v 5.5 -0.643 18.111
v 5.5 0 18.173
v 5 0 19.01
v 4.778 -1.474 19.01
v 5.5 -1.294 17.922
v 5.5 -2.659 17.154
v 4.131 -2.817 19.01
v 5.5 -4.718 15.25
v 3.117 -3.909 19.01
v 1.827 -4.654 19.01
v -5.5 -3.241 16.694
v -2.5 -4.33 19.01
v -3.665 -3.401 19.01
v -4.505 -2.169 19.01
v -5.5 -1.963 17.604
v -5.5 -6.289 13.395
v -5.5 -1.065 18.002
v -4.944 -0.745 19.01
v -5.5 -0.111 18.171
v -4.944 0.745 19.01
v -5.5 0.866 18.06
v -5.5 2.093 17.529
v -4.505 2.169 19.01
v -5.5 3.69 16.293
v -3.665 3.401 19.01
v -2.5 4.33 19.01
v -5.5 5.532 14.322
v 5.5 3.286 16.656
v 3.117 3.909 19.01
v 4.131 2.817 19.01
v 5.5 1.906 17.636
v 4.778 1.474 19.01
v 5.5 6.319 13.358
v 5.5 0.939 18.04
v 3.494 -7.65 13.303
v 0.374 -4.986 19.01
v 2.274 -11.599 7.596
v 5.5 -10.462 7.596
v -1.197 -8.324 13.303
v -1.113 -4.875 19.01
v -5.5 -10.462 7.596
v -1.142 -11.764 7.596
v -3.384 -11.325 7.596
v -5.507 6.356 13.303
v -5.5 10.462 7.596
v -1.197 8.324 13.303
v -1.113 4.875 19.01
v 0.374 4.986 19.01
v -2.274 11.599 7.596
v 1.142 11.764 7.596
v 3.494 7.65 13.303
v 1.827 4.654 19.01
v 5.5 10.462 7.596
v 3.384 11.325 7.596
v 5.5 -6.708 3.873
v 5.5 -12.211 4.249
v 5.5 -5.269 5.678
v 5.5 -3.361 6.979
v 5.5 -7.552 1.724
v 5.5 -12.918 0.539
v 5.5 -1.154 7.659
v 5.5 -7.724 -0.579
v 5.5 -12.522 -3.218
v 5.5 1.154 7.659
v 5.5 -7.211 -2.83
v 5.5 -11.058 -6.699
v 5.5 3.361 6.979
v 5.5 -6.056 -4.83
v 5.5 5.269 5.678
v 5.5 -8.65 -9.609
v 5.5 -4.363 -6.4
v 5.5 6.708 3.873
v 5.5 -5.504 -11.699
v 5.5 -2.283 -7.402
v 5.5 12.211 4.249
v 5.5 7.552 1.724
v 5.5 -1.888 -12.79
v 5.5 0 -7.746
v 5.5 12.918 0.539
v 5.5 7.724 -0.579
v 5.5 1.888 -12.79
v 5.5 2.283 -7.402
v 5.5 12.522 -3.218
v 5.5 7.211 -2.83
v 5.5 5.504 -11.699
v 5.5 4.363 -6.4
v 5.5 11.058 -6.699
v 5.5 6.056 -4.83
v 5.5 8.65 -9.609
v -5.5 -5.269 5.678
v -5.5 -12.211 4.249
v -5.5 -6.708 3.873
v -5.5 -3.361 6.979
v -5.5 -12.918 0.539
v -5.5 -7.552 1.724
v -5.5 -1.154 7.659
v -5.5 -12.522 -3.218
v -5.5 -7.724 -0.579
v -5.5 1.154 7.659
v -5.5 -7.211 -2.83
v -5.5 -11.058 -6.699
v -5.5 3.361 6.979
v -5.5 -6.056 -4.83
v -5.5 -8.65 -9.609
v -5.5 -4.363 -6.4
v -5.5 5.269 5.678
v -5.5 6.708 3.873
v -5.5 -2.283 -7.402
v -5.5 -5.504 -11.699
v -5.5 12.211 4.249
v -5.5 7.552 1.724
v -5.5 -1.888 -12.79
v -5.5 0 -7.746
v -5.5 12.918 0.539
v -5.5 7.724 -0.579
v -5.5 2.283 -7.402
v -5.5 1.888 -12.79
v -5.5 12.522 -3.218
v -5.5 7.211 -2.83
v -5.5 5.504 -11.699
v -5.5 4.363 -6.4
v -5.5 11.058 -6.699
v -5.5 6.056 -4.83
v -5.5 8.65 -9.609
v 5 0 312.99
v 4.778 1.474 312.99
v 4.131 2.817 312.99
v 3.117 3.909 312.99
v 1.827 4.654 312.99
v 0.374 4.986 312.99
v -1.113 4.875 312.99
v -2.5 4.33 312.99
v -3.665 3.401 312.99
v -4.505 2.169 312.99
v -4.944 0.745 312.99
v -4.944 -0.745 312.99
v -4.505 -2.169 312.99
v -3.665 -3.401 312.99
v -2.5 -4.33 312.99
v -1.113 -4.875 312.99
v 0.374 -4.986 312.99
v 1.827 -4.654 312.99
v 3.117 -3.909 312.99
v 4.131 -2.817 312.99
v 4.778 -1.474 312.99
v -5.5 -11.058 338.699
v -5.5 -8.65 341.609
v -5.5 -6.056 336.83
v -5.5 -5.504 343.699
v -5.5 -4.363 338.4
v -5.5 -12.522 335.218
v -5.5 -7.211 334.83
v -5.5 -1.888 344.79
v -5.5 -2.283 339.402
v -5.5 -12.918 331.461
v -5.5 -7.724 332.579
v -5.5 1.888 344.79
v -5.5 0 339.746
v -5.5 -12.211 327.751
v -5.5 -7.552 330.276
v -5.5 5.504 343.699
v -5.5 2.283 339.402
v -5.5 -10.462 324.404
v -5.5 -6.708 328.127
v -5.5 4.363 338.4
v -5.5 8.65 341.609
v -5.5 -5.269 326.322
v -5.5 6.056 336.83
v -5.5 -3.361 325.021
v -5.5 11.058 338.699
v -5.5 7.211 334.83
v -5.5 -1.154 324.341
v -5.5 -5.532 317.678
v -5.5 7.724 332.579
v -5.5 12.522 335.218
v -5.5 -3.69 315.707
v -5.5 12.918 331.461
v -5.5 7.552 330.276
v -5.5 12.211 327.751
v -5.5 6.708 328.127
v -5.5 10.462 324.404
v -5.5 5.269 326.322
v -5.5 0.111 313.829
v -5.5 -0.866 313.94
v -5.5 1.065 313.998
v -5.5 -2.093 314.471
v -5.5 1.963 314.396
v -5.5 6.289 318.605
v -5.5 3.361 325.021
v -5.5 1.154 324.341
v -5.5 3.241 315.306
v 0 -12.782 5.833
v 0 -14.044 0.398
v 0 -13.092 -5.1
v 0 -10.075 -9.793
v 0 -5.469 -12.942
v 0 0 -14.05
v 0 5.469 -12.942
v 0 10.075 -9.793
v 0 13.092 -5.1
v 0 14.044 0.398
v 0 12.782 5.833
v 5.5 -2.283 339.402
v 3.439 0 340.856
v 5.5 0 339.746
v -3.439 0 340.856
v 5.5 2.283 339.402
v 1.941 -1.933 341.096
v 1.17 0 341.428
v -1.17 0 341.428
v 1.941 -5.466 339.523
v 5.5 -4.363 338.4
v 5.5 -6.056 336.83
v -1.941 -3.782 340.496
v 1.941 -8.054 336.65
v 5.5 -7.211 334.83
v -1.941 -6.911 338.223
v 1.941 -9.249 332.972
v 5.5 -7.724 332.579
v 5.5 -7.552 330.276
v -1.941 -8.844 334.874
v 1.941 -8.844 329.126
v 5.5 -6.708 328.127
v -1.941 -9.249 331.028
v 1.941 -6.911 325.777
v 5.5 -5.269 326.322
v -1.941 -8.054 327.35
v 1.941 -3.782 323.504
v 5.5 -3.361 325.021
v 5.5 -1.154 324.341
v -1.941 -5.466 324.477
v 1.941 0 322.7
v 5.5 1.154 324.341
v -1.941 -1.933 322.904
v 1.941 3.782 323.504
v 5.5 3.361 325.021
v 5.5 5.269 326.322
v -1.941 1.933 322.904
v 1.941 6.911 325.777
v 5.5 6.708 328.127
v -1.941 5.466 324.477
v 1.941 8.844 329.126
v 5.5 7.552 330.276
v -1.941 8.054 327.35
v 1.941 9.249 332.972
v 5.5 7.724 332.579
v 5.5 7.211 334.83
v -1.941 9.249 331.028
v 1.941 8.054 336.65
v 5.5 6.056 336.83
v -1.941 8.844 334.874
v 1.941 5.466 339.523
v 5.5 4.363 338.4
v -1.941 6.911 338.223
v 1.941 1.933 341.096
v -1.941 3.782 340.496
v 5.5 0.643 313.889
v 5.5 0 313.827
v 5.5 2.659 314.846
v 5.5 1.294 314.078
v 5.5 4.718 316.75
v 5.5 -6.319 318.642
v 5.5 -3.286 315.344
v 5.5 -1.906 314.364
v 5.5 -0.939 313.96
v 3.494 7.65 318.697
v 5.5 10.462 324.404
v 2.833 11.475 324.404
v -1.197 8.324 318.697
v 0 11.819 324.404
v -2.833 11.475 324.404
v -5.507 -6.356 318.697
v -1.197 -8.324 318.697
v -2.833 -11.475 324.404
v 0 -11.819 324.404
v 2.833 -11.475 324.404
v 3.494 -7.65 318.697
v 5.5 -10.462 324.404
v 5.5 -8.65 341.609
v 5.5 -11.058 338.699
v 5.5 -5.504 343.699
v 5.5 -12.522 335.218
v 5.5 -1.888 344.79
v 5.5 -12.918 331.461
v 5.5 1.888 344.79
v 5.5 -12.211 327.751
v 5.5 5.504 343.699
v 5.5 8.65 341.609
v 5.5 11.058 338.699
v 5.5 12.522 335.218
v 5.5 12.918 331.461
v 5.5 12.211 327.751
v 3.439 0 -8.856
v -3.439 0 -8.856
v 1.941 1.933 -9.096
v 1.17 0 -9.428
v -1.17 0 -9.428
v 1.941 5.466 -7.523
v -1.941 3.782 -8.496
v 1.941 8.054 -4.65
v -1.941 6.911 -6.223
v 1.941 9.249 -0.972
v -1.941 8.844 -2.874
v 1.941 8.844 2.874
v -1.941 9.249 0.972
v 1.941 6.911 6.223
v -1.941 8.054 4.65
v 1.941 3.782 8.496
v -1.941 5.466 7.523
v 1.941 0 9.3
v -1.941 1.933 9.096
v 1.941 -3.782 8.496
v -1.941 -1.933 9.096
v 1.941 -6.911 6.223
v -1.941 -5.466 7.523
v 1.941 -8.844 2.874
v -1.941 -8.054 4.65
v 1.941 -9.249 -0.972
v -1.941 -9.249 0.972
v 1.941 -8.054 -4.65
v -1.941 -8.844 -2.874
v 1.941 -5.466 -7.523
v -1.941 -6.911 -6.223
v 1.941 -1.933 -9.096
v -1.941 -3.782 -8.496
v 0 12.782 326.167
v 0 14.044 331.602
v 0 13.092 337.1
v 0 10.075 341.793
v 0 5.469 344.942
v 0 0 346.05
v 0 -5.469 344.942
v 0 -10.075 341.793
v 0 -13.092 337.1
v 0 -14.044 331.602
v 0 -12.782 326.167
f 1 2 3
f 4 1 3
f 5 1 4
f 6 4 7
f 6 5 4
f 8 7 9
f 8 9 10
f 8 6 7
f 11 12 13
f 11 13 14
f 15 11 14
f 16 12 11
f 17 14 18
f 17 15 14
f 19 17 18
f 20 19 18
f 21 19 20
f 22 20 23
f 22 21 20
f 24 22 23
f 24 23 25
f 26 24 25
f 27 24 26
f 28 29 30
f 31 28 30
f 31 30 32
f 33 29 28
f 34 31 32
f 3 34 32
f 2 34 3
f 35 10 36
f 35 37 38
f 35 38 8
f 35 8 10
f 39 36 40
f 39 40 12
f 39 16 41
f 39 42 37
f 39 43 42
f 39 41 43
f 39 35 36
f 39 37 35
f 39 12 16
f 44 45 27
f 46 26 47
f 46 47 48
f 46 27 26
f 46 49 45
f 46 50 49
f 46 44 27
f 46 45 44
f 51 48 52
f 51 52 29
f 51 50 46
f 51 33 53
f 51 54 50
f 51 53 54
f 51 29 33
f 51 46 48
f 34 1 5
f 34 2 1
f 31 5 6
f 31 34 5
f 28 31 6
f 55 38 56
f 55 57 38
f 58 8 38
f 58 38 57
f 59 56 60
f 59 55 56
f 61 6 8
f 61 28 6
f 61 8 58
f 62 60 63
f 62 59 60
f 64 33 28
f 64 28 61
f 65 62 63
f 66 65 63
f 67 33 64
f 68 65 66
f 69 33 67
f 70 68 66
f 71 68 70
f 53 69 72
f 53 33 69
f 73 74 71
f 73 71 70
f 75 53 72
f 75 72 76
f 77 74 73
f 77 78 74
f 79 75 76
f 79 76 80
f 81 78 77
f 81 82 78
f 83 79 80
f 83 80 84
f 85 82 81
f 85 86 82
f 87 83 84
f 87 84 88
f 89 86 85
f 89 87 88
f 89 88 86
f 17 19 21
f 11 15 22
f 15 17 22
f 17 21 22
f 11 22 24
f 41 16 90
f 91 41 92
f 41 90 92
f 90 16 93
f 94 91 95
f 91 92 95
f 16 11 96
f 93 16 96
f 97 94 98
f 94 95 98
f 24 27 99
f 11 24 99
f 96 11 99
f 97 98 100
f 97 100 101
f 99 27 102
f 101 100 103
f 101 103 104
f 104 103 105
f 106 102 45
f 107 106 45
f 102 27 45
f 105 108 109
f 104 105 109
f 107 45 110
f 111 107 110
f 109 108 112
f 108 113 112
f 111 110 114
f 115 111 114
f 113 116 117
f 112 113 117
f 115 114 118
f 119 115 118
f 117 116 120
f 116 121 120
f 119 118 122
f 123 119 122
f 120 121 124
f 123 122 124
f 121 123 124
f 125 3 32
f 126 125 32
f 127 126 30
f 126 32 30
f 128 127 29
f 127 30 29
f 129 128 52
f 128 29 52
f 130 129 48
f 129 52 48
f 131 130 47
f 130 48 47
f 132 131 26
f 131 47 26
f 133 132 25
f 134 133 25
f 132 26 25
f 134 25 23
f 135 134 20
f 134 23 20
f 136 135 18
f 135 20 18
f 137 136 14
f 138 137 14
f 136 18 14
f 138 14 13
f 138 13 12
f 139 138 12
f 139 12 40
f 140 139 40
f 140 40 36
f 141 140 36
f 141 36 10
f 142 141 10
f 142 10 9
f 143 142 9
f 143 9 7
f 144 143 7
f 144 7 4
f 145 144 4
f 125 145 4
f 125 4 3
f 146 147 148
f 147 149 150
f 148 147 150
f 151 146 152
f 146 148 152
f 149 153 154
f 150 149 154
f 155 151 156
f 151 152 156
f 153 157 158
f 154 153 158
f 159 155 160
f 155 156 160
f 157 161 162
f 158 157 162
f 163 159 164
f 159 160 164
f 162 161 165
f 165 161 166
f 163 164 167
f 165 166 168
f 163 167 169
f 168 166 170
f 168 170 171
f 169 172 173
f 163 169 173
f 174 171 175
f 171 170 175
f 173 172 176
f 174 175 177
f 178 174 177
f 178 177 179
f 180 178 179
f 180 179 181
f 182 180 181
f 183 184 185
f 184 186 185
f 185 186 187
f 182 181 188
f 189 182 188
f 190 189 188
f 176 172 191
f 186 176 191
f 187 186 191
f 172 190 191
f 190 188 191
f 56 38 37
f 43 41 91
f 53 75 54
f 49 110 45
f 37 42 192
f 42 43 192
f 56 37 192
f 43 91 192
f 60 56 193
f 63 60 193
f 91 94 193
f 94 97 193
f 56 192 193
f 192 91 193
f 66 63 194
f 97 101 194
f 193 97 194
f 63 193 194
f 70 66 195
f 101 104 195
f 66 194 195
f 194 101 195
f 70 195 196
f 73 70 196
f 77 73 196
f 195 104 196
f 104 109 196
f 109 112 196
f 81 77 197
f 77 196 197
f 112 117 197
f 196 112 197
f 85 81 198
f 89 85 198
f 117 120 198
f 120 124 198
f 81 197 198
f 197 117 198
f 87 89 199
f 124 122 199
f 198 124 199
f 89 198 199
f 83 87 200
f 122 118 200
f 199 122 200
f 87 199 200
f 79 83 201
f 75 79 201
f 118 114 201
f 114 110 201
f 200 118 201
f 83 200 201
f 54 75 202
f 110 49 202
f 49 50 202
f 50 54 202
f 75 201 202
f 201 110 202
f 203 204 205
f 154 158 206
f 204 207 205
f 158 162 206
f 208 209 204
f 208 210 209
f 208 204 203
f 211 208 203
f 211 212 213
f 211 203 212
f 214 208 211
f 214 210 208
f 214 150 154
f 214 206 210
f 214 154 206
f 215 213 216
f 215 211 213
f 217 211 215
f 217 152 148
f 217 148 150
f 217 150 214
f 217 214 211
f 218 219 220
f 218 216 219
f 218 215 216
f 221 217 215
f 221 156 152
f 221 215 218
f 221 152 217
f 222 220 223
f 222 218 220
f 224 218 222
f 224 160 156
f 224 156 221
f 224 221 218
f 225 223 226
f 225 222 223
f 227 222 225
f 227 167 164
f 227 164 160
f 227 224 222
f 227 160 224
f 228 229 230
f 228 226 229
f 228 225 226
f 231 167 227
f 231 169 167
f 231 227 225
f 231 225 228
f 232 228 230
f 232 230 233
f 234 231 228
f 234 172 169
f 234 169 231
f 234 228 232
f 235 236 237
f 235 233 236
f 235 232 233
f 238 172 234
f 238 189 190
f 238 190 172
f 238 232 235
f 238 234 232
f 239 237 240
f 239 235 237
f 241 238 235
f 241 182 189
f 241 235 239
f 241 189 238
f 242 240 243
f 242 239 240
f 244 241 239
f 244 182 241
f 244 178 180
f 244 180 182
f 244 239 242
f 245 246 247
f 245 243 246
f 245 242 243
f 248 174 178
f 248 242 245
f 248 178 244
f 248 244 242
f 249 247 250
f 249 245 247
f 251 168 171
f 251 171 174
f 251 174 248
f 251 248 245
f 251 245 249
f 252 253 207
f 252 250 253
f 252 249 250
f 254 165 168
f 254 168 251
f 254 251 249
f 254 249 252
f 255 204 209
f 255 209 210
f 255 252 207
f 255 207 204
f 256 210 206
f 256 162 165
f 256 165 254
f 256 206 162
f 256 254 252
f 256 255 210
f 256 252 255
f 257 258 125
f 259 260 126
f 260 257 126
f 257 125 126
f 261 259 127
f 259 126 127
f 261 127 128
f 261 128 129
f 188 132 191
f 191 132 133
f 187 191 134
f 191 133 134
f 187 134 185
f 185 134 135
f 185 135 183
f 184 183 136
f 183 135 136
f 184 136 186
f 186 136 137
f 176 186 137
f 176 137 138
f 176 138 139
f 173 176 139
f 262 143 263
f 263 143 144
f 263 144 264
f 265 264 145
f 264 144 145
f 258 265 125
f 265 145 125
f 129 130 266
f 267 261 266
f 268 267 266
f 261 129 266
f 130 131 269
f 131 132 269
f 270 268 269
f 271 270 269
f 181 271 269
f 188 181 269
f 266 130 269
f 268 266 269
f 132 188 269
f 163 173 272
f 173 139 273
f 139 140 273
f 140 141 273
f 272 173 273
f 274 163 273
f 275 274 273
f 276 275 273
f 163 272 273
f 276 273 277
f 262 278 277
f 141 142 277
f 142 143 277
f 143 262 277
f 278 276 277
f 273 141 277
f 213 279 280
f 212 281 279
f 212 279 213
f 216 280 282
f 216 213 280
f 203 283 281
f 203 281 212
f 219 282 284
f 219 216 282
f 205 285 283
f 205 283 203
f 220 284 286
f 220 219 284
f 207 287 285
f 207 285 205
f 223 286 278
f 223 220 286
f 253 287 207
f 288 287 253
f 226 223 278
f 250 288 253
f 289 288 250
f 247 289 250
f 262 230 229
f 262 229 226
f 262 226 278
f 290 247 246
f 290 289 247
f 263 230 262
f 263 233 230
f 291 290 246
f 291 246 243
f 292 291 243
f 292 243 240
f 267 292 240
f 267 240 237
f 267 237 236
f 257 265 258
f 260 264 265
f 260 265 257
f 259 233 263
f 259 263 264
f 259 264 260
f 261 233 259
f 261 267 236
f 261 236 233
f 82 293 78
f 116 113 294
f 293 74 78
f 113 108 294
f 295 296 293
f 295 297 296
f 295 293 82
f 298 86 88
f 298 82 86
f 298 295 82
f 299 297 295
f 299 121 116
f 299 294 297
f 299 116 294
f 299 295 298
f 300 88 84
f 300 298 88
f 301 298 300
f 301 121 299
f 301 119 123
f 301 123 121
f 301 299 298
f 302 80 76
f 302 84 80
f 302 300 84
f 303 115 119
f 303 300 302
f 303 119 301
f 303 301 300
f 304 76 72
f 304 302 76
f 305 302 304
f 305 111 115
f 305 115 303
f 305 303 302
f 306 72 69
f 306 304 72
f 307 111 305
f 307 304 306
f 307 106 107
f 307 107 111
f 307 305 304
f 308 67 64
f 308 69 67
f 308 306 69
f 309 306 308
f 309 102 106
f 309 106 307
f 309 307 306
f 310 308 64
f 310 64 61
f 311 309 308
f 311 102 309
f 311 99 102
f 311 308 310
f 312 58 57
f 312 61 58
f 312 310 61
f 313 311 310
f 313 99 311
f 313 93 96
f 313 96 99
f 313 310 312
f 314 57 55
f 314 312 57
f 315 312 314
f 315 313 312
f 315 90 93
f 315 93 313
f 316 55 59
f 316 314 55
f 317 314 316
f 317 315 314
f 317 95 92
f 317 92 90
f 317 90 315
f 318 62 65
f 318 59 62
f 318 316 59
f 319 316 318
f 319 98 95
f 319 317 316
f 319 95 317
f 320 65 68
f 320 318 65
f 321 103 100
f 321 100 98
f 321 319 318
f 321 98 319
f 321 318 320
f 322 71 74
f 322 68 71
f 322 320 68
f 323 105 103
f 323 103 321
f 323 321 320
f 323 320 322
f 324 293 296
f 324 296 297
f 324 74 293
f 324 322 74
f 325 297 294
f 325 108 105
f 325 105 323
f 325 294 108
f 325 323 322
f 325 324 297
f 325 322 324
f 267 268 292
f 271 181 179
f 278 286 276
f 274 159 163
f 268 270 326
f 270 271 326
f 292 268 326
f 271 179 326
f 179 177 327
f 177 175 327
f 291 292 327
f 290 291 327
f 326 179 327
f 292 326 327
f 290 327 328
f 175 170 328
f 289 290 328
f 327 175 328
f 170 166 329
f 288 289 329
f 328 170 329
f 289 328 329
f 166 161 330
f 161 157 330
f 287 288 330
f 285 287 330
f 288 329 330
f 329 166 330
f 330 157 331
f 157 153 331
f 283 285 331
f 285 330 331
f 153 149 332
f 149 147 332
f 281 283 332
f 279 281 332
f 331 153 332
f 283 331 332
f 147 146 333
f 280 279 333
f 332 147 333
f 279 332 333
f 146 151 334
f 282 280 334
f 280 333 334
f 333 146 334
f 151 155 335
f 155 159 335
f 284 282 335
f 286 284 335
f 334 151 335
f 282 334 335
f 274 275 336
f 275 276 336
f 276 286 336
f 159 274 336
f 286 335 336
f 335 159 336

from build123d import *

# Parameters (mm, degrees)
SKETCH3_R           = 5
BOSS_EXTRUDE2_DEPTH = 332
CUT_EXTRUDE1_START  = -5.5
SKETCH7_R           = 24.093580554
CUT_EXTRUDE1_DEPTH  = 342.119975622
CUT_EXTRUDE2_START  = 5.5
SKETCH7_2_R         = 24.093580554
CUT_EXTRUDE2_DEPTH  = 342.119975622


with BuildPart() as part:
    # Sketch3 → Boss-Extrude2 (new body)
    with BuildSketch(Plane.XY):
        Circle(SKETCH3_R)
    extrude(amount=BOSS_EXTRUDE2_DEPTH)

    # Sketch4 → Revolve10 (revolve)
    with BuildSketch(Plane(origin=(0, 0, 0), x_dir=(1, 0, 0), z_dir=(0, 1, 0))):
        with BuildLine():
            Line((14.05, -332), (-14.05, -332))
            ThreePointArc((-14.05, -332), (0, -346.05), (14.05, -332))
        make_face()
    revolve(axis=Axis((-14.05, 0, 332), (1, 0, 0)))

    # Sketch4<6> → Revolve11 (revolve)
    with BuildSketch(Plane(origin=(0, 0, 0), x_dir=(1, 0, 0), z_dir=(0, 1, 0))):
        with BuildLine():
            ThreePointArc((14.05, 0), (0, 14.05), (-14.05, 0))
            Line((-14.05, 0), (14.05, 0))
        make_face()
    revolve(axis=Axis((-14.05, 0, 0), (1, 0, 0)))

    # Sketch8 → Revolve12 (revolve)
    with BuildSketch(Plane(origin=(0, 0, 0), x_dir=(1, 0, 0), z_dir=(0, 1, 0))):
        Polygon((12.29, -6.808700317), (0, -6.808700317), (0, -19.01), (5, -19.01), align=None)
    revolve(axis=Axis((0, 0, 19.01), (0, 0, -1)))

    # Sketch8<3> → Revolve13 (revolve)
    with BuildSketch(Plane(origin=(0, 0, 0), x_dir=(1, 0, 0), z_dir=(0, 1, 0))):
        Polygon((5, -312.99), (0, -312.99), (0, -325.191299683), (12.29, -325.191299683), align=None)
    revolve(axis=Axis((0, 0, 312.99), (0, 0, 1)))

    # Sketch7 → Cut-Extrude1 (cut, through all)
    with BuildSketch(Plane(origin=(0, 0, 0), x_dir=(0, 0, -1), z_dir=(1, 0, 0)).offset(CUT_EXTRUDE1_START)):
        Circle(SKETCH7_R)
        with Locations((-332, 0)):
            Circle(SKETCH7_R)
    extrude(amount=-CUT_EXTRUDE1_DEPTH, mode=Mode.SUBTRACT)

    # Sketch7<2> → Cut-Extrude2 (cut, through all)
    with BuildSketch(Plane(origin=(0, 0, 0), x_dir=(0, 0, -1), z_dir=(1, 0, 0)).offset(CUT_EXTRUDE2_START)):
        Circle(SKETCH7_2_R)
        with Locations((-332, 0)):
            Circle(SKETCH7_2_R)
    extrude(amount=CUT_EXTRUDE2_DEPTH, mode=Mode.SUBTRACT)

    # Sketch6 → Cut-Revolve1 (revolve, cut)
    with BuildSketch(Plane(origin=(0, 0, 0), x_dir=(1, 0, 0), z_dir=(0, 1, 0))):
        with BuildLine():
            ThreePointArc((9.5, 0), (0, 9.5), (-9.5, 0))
            Line((-9.5, 0), (9.5, 0))
        make_face()
    revolve(axis=Axis((-9.5, 0, 0), (1, 0, 0)), mode=Mode.SUBTRACT)

    # Sketch6<3> → Cut-Revolve2 (revolve, cut)
    with BuildSketch(Plane(origin=(0, 0, 0), x_dir=(1, 0, 0), z_dir=(0, 1, 0))):
        with BuildLine():
            Line((-9.5, -332), (9.5, -332))
            ThreePointArc((9.5, -332), (0, -341.5), (-9.5, -332))
        make_face()
    revolve(axis=Axis((-9.5, 0, 332), (1, 0, 0)), mode=Mode.SUBTRACT)


solid = part.part
